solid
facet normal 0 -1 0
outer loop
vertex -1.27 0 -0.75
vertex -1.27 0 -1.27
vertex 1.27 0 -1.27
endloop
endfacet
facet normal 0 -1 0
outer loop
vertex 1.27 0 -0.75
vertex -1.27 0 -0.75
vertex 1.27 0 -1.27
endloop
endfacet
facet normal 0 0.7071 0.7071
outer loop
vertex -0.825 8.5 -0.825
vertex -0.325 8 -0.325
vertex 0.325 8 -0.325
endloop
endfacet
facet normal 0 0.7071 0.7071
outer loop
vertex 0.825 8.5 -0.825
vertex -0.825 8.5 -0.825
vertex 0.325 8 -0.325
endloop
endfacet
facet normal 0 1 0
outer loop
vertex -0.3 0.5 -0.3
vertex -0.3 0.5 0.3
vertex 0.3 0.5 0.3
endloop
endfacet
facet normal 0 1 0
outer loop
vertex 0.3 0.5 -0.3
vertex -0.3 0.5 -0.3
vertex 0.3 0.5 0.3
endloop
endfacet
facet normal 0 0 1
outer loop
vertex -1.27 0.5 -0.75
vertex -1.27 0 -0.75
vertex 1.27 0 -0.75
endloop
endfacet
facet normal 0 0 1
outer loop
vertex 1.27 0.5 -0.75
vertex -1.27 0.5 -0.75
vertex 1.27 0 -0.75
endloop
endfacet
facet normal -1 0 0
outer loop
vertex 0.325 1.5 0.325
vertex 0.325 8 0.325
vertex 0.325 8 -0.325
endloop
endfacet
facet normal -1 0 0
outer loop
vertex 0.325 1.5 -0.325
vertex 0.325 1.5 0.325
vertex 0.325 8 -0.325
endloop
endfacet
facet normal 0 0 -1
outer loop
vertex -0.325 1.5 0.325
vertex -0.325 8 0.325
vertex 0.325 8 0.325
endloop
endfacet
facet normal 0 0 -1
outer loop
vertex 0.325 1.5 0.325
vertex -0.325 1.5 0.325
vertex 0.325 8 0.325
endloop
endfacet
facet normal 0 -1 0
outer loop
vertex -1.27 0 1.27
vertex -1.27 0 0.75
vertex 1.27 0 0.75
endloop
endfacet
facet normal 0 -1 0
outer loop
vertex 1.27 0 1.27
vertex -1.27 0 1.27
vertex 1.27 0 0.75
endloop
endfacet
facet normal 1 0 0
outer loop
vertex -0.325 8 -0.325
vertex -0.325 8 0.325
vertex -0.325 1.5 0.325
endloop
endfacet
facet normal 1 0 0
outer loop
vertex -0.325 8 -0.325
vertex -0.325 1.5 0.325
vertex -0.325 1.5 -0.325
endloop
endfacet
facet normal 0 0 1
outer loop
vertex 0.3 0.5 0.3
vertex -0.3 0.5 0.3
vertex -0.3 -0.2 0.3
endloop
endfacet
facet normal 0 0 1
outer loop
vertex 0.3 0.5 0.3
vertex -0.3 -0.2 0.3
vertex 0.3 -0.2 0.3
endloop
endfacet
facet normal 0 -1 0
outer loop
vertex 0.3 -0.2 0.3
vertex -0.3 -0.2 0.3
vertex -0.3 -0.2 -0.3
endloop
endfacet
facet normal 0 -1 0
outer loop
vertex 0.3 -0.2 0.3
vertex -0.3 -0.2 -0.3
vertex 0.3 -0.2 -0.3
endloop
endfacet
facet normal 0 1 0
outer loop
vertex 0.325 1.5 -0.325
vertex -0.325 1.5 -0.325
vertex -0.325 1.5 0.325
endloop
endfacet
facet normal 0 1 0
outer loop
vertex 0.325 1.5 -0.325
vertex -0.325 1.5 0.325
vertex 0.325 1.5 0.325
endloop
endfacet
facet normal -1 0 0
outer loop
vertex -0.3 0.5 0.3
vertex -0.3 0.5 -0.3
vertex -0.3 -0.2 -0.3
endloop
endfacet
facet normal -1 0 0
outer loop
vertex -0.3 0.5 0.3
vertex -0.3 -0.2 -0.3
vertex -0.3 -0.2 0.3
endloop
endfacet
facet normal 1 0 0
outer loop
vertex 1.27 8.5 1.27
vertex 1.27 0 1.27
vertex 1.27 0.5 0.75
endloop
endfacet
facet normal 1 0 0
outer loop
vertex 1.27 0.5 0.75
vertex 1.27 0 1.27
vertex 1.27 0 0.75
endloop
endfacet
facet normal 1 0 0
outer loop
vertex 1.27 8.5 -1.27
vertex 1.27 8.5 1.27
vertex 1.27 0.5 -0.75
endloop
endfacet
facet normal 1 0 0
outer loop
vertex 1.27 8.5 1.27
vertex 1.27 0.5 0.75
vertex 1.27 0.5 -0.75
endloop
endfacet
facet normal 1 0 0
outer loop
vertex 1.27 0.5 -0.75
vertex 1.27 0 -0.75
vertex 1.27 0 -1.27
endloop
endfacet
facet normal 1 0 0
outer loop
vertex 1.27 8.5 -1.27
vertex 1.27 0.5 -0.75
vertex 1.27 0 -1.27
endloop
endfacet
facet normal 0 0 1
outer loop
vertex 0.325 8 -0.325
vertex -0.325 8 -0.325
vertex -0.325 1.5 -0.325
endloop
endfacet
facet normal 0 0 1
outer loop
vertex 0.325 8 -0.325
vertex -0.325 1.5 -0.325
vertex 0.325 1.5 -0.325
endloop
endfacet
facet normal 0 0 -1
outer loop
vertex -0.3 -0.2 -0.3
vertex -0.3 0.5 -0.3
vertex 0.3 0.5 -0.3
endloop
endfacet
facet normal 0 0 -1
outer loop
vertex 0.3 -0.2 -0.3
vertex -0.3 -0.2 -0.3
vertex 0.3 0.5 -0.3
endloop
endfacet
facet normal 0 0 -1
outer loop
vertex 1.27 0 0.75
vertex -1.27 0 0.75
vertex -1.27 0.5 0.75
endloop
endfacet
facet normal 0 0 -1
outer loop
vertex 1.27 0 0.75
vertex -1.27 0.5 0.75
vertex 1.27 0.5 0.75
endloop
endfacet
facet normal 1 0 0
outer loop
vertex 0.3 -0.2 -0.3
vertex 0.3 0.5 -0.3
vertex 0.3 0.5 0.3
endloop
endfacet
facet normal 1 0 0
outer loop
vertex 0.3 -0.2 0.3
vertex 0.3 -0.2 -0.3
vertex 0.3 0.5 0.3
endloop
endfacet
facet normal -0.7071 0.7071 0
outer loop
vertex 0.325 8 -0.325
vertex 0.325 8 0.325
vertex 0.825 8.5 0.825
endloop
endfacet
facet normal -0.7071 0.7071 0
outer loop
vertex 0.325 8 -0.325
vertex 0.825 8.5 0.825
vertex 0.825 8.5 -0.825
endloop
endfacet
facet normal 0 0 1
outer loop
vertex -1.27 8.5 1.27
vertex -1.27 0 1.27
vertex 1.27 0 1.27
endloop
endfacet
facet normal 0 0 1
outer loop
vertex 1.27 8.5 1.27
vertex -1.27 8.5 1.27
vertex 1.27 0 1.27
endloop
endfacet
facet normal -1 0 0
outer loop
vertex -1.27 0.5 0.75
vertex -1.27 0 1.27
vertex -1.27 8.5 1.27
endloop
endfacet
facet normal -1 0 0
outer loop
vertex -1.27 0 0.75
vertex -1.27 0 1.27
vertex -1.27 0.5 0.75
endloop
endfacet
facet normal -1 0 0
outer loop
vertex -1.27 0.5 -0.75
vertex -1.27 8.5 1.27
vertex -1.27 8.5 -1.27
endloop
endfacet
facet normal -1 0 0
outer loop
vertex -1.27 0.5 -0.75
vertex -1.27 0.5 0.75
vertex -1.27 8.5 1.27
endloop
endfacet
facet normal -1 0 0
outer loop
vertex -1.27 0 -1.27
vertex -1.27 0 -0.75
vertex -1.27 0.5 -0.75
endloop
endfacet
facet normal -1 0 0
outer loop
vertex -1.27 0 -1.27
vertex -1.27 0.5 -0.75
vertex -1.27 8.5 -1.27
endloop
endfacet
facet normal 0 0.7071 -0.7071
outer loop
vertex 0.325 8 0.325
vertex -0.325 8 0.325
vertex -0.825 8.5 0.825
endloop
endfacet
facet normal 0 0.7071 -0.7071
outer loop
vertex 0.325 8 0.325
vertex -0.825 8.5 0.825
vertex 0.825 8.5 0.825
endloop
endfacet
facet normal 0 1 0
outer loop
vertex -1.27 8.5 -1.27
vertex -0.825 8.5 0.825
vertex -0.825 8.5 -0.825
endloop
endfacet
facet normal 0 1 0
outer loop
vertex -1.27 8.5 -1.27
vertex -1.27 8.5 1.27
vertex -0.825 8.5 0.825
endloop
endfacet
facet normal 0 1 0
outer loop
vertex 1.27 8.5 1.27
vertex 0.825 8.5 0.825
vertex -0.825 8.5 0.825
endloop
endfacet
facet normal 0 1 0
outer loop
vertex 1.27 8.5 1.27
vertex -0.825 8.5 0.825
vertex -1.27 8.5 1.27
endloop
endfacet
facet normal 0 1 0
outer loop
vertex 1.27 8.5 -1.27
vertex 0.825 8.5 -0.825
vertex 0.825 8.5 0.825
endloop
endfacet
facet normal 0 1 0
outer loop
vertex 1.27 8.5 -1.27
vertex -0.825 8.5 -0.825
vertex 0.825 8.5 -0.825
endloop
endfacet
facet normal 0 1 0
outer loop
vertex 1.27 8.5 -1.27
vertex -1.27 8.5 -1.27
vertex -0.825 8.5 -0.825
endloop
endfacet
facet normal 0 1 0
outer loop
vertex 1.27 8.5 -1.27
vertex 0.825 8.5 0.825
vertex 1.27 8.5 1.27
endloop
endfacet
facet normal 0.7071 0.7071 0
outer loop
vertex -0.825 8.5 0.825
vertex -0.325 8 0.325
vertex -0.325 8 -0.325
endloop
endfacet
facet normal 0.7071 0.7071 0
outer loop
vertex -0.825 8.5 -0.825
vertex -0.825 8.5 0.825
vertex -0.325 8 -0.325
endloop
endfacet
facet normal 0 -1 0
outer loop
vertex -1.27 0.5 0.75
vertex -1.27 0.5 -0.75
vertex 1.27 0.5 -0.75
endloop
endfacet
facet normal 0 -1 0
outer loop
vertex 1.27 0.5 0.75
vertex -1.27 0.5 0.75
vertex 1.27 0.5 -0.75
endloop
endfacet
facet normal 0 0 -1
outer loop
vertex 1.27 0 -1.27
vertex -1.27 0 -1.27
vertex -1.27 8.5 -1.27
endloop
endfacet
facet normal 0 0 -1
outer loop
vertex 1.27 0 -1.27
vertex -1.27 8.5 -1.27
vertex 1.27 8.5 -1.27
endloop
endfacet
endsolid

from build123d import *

# Parameters (mm, degrees)
SKETCH_1_W      = 2.54
SKETCH_1_H      = 2.54
EXTRUDE_1_DEPTH = 8.5
SKETCH_2_W      = 3
SKETCH_2_H      = 1.5
EXTRUDE_2_DEPTH = 0.5
SKETCH_3_W      = 0.6
SKETCH_3_H      = 0.6
EXTRUDE_3_DEPTH = 0.7
SKETCH_5_W      = 0.65
SKETCH_5_H      = 0.65
EXTRUDE_4_DEPTH = 7
CHAMFER_1_SIZE  = 0.5


with BuildPart() as part:
    # Эскиз1 → Бобышка-Вытянуть1 (new body)
    with BuildSketch(Plane(origin=(0, 0, 0), x_dir=(1, 0, 0), z_dir=(0, 1, 0))):
        Rectangle(SKETCH_1_W, SKETCH_1_H)
    extrude(amount=EXTRUDE_1_DEPTH)


with BuildPart() as body_2:
    # Эскиз2 → Бобышка-Вытянуть2 (new body)
    with BuildSketch(Plane(origin=(0, 0, 0), x_dir=(1, 0, 0), z_dir=(0, 1, 0))):
        Rectangle(SKETCH_2_W, SKETCH_2_H)
    extrude(amount=EXTRUDE_2_DEPTH)


with BuildPart() as part_1:
    add(part.part)

    # Combine 2: cut body 2
    add(body_2.part, mode=Mode.SUBTRACT)


with BuildPart() as body_2_2:
    # Эскиз3 → Бобышка-Вытянуть3 (new body)
    with BuildSketch(Plane.XZ.offset(-0.5)):
        Rectangle(SKETCH_3_W, SKETCH_3_H)
    extrude(amount=EXTRUDE_3_DEPTH)


with BuildPart() as body_3:
    # Эскиз5 → Бобышка-Вытянуть4 (new body)
    with BuildSketch(Plane(origin=(0, 8.5, 0), x_dir=(1, 0, 0), z_dir=(0, 1, 0))):
        Rectangle(SKETCH_5_W, SKETCH_5_H)
    extrude(amount=-EXTRUDE_4_DEPTH)


with BuildPart() as part_2:
    add(part_1.part)

    # Combine 3: cut body 3
    add(body_3.part, mode=Mode.SUBTRACT)

    # Фаска1
    chamfer_1_edges = [part_2.edges().sort_by_distance(p)[0] for p in [
        (0.325, 8.5, 0),
        (0, 8.5, -0.325),
        (-0.325, 8.5, 0),
        (0, 8.5, 0.325),
    ]]
    chamfer(chamfer_1_edges, length=CHAMFER_1_SIZE)


solid = Compound([body_2_2.part, part_2.part])
